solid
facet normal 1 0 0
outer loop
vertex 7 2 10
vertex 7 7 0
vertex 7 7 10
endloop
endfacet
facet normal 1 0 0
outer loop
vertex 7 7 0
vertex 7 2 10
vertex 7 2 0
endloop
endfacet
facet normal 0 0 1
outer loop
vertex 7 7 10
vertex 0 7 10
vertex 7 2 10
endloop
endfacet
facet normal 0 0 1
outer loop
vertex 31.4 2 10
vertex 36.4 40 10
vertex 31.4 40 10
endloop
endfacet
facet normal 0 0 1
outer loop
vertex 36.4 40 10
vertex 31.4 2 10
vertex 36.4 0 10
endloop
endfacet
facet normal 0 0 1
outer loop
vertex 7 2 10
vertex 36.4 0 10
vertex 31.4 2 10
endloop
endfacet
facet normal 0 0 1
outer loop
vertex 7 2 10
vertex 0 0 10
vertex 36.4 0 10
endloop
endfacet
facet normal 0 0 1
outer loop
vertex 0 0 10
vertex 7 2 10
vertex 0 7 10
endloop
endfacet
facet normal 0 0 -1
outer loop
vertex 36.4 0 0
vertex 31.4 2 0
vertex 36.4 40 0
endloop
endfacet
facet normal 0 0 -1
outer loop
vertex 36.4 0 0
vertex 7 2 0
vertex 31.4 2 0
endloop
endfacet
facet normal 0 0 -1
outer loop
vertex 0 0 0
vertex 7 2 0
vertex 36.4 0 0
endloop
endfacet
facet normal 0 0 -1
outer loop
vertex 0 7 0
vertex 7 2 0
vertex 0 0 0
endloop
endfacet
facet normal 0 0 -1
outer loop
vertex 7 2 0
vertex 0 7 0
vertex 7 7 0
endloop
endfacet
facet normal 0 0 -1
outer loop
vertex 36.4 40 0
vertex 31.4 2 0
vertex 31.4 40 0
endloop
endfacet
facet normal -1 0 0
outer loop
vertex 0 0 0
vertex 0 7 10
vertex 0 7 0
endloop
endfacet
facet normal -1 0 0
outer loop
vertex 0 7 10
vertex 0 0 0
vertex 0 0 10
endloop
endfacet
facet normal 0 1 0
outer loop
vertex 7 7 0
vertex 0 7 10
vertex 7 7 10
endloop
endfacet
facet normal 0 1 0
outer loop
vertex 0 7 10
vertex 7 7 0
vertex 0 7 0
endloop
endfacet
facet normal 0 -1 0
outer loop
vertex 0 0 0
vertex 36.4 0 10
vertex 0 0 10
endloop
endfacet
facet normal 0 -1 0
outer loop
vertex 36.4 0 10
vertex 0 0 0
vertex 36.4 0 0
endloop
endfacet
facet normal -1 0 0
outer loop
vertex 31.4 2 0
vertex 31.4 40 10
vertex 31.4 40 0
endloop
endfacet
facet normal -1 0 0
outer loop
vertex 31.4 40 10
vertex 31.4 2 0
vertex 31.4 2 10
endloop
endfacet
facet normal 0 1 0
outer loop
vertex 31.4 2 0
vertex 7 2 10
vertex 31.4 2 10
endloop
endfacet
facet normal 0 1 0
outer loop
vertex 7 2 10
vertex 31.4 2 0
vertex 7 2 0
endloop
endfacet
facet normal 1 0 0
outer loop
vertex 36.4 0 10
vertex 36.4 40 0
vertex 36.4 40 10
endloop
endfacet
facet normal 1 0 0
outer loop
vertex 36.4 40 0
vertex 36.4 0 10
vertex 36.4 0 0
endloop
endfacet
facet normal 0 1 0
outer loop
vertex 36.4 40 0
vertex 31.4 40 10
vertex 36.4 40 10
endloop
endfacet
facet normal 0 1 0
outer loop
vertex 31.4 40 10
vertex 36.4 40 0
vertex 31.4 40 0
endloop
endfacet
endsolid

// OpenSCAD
height = 10;
little_depth = 7;
little_width = 7;
depth = 40;
width = 24.4;
cube([little_width, little_depth, height]);
translate([little_width, 0, 0])
cube([width, 2, height]);
translate([little_width + width, 0, 0])
cube([5, depth, height]);
